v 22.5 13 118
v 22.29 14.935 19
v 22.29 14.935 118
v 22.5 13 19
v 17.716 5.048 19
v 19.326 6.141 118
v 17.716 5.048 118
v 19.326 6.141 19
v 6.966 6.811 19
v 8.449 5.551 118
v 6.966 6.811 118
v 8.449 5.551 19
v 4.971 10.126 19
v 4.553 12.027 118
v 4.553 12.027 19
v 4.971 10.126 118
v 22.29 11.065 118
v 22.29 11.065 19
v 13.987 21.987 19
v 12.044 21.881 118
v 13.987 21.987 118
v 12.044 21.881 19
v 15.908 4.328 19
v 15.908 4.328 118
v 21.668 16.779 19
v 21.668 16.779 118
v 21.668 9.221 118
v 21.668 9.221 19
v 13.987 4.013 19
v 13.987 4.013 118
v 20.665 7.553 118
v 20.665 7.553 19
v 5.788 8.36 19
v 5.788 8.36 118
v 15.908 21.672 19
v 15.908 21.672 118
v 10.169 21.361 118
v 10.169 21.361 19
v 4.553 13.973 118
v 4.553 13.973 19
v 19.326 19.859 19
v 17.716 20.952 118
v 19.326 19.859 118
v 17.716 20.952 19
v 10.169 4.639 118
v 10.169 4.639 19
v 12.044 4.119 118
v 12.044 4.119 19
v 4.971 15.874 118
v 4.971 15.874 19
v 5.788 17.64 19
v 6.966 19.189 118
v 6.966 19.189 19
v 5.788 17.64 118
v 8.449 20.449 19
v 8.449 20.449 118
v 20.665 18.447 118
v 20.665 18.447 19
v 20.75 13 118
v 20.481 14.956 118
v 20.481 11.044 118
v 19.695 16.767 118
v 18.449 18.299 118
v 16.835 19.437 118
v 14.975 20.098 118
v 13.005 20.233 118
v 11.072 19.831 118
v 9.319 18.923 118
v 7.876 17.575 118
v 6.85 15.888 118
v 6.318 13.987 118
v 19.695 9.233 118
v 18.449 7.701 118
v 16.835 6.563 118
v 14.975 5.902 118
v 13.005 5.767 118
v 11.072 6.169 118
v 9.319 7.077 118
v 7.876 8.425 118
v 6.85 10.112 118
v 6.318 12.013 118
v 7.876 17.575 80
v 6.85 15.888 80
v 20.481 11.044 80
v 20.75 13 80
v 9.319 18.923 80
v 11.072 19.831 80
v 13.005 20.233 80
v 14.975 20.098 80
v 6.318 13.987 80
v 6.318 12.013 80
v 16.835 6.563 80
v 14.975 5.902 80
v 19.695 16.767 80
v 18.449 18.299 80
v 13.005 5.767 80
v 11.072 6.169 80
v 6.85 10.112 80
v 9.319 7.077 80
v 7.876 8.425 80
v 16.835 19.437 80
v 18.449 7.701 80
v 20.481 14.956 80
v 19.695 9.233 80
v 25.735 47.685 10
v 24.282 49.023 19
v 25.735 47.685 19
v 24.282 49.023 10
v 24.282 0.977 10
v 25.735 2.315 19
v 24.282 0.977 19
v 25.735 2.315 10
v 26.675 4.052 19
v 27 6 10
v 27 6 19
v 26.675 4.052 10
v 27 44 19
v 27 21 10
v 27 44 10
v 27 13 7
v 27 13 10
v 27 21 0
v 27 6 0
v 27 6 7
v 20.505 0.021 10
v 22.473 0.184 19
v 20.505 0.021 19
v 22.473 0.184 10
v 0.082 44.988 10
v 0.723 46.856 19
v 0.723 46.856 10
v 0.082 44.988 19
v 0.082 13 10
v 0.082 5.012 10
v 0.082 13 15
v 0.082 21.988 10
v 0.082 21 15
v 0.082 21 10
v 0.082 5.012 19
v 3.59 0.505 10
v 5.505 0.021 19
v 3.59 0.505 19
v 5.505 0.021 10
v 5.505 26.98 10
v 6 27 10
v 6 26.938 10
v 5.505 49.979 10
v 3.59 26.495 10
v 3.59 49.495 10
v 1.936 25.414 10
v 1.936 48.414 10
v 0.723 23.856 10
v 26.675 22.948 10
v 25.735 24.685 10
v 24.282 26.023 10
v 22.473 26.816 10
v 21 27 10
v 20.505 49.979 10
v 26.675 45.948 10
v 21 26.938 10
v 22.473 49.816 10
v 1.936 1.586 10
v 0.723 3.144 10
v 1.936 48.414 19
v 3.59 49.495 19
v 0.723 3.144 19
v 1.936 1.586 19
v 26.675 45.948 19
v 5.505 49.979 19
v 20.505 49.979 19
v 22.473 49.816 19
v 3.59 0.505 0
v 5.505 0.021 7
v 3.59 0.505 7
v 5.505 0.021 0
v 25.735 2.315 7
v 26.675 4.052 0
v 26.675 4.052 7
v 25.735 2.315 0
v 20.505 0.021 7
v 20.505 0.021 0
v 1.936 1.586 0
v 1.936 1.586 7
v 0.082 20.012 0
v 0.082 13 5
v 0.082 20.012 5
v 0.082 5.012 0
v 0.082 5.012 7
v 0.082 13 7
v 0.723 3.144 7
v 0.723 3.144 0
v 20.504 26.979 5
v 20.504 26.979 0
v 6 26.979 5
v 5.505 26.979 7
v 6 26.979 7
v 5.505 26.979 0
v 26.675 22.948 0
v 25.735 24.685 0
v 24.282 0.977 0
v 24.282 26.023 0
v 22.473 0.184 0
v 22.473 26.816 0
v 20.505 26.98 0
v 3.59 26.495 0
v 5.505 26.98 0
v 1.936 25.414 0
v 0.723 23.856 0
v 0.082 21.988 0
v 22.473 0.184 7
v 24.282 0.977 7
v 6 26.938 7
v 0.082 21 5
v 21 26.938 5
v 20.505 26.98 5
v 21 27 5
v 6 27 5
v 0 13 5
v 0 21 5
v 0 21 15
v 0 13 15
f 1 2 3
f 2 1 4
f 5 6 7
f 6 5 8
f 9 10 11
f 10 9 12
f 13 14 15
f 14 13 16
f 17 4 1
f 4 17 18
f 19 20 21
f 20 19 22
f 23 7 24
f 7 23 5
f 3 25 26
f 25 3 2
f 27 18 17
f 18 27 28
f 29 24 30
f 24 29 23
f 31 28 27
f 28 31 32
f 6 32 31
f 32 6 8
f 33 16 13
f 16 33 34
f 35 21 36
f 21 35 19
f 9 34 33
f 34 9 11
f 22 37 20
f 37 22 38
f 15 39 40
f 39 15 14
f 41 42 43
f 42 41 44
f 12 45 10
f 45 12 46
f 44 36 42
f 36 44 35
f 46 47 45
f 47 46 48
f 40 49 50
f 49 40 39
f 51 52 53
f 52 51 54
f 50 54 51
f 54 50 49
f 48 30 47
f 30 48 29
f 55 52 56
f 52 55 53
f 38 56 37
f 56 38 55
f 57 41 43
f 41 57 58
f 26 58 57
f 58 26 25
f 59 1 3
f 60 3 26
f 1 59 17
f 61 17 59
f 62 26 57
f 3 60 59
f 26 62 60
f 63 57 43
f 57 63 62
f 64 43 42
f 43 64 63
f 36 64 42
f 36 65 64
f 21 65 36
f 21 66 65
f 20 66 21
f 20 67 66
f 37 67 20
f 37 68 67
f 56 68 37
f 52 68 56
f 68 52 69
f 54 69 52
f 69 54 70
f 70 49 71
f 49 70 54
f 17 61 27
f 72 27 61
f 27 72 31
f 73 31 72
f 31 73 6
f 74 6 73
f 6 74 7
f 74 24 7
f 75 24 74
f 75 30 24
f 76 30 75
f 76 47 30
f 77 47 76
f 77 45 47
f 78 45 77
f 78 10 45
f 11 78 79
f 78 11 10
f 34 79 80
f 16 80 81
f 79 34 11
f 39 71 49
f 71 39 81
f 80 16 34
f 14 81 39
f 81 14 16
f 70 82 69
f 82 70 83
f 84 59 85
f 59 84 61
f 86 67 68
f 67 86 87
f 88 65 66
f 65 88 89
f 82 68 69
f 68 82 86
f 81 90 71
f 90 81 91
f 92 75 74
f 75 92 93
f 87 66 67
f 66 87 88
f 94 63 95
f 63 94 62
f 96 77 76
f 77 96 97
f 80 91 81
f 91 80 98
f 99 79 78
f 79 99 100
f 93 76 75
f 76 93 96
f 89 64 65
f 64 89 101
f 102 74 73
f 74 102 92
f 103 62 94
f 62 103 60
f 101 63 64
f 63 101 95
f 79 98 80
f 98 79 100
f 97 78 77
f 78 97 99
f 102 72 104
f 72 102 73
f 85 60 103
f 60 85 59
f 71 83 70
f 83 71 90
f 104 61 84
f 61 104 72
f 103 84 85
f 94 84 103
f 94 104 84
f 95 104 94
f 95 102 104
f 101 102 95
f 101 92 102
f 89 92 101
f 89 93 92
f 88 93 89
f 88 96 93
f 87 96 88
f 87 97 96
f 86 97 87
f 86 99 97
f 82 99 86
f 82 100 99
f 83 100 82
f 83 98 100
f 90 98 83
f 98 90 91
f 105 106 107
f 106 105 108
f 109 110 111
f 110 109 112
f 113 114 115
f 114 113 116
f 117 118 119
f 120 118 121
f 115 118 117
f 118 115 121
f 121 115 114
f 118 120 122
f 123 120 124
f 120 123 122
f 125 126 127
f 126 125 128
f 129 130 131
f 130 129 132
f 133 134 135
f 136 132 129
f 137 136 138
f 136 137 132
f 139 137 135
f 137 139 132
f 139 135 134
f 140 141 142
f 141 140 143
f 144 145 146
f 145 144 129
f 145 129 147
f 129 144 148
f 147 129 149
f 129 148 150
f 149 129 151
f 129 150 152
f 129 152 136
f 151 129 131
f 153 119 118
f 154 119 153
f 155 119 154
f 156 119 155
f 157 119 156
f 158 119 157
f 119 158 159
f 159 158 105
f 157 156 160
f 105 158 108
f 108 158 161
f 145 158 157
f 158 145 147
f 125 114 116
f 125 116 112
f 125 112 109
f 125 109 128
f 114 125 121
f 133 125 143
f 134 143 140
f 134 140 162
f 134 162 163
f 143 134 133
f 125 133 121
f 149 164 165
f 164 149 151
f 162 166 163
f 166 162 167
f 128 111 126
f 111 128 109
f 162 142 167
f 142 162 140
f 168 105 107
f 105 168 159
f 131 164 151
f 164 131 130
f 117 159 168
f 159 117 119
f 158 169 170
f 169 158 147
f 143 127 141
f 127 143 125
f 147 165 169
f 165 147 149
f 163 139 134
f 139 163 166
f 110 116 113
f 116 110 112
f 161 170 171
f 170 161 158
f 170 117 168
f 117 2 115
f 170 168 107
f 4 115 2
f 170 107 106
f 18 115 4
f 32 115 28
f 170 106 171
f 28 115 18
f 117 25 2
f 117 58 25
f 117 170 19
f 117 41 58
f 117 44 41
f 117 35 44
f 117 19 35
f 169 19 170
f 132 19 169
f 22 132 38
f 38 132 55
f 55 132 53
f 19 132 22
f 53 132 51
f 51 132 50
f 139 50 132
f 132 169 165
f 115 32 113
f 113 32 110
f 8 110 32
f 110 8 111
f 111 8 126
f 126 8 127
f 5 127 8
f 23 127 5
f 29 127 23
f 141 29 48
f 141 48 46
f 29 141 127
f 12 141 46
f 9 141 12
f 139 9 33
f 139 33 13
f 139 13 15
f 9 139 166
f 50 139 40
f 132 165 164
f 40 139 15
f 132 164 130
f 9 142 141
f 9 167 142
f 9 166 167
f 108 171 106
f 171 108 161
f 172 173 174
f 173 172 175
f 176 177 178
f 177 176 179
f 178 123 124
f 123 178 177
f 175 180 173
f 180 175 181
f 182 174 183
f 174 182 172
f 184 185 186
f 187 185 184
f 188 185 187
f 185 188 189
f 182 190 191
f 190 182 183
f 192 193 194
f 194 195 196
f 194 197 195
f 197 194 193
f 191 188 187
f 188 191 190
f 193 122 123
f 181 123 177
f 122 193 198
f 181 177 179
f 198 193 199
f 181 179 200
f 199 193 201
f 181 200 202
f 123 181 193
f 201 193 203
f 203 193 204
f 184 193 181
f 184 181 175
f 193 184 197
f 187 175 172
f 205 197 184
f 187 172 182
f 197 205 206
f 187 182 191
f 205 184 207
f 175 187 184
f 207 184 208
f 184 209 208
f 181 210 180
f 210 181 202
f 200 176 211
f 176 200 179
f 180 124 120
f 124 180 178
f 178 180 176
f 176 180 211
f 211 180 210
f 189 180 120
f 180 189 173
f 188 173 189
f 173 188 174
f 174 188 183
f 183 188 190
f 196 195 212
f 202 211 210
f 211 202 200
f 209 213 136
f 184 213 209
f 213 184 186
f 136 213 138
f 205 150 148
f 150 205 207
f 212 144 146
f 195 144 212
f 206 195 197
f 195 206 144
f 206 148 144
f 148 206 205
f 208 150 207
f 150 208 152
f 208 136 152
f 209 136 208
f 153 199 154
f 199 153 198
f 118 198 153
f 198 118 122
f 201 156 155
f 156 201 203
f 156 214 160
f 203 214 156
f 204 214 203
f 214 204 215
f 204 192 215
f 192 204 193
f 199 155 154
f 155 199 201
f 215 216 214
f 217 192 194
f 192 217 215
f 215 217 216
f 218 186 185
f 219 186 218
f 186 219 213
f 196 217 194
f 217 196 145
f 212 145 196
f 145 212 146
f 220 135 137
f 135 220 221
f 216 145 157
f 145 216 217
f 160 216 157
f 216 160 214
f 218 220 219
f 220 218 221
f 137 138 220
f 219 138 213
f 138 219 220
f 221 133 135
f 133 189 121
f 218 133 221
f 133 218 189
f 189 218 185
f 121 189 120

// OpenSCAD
translate([0,0,10]) linear_extrude (9) minkowski(){
translate([6,6,0]) square([15,38]);
circle(6);    
}

linear_extrude (7) minkowski(){
translate([6,6,0]) square([15,15]);
circle(6);    
}

translate([6,21,0]) linear_extrude (10) circle(6);
translate([21,21,0]) linear_extrude (10) circle(6);

translate([6,18,5]) linear_extrude (10) square([15,9]);
translate([0,13,5]) linear_extrude (10) square([27,8]);

difference (){
translate([13.5,13,18]) linear_extrude (100) circle(9);
translate([13.5,13,80]) linear_extrude (40) circle(7.25);
}
